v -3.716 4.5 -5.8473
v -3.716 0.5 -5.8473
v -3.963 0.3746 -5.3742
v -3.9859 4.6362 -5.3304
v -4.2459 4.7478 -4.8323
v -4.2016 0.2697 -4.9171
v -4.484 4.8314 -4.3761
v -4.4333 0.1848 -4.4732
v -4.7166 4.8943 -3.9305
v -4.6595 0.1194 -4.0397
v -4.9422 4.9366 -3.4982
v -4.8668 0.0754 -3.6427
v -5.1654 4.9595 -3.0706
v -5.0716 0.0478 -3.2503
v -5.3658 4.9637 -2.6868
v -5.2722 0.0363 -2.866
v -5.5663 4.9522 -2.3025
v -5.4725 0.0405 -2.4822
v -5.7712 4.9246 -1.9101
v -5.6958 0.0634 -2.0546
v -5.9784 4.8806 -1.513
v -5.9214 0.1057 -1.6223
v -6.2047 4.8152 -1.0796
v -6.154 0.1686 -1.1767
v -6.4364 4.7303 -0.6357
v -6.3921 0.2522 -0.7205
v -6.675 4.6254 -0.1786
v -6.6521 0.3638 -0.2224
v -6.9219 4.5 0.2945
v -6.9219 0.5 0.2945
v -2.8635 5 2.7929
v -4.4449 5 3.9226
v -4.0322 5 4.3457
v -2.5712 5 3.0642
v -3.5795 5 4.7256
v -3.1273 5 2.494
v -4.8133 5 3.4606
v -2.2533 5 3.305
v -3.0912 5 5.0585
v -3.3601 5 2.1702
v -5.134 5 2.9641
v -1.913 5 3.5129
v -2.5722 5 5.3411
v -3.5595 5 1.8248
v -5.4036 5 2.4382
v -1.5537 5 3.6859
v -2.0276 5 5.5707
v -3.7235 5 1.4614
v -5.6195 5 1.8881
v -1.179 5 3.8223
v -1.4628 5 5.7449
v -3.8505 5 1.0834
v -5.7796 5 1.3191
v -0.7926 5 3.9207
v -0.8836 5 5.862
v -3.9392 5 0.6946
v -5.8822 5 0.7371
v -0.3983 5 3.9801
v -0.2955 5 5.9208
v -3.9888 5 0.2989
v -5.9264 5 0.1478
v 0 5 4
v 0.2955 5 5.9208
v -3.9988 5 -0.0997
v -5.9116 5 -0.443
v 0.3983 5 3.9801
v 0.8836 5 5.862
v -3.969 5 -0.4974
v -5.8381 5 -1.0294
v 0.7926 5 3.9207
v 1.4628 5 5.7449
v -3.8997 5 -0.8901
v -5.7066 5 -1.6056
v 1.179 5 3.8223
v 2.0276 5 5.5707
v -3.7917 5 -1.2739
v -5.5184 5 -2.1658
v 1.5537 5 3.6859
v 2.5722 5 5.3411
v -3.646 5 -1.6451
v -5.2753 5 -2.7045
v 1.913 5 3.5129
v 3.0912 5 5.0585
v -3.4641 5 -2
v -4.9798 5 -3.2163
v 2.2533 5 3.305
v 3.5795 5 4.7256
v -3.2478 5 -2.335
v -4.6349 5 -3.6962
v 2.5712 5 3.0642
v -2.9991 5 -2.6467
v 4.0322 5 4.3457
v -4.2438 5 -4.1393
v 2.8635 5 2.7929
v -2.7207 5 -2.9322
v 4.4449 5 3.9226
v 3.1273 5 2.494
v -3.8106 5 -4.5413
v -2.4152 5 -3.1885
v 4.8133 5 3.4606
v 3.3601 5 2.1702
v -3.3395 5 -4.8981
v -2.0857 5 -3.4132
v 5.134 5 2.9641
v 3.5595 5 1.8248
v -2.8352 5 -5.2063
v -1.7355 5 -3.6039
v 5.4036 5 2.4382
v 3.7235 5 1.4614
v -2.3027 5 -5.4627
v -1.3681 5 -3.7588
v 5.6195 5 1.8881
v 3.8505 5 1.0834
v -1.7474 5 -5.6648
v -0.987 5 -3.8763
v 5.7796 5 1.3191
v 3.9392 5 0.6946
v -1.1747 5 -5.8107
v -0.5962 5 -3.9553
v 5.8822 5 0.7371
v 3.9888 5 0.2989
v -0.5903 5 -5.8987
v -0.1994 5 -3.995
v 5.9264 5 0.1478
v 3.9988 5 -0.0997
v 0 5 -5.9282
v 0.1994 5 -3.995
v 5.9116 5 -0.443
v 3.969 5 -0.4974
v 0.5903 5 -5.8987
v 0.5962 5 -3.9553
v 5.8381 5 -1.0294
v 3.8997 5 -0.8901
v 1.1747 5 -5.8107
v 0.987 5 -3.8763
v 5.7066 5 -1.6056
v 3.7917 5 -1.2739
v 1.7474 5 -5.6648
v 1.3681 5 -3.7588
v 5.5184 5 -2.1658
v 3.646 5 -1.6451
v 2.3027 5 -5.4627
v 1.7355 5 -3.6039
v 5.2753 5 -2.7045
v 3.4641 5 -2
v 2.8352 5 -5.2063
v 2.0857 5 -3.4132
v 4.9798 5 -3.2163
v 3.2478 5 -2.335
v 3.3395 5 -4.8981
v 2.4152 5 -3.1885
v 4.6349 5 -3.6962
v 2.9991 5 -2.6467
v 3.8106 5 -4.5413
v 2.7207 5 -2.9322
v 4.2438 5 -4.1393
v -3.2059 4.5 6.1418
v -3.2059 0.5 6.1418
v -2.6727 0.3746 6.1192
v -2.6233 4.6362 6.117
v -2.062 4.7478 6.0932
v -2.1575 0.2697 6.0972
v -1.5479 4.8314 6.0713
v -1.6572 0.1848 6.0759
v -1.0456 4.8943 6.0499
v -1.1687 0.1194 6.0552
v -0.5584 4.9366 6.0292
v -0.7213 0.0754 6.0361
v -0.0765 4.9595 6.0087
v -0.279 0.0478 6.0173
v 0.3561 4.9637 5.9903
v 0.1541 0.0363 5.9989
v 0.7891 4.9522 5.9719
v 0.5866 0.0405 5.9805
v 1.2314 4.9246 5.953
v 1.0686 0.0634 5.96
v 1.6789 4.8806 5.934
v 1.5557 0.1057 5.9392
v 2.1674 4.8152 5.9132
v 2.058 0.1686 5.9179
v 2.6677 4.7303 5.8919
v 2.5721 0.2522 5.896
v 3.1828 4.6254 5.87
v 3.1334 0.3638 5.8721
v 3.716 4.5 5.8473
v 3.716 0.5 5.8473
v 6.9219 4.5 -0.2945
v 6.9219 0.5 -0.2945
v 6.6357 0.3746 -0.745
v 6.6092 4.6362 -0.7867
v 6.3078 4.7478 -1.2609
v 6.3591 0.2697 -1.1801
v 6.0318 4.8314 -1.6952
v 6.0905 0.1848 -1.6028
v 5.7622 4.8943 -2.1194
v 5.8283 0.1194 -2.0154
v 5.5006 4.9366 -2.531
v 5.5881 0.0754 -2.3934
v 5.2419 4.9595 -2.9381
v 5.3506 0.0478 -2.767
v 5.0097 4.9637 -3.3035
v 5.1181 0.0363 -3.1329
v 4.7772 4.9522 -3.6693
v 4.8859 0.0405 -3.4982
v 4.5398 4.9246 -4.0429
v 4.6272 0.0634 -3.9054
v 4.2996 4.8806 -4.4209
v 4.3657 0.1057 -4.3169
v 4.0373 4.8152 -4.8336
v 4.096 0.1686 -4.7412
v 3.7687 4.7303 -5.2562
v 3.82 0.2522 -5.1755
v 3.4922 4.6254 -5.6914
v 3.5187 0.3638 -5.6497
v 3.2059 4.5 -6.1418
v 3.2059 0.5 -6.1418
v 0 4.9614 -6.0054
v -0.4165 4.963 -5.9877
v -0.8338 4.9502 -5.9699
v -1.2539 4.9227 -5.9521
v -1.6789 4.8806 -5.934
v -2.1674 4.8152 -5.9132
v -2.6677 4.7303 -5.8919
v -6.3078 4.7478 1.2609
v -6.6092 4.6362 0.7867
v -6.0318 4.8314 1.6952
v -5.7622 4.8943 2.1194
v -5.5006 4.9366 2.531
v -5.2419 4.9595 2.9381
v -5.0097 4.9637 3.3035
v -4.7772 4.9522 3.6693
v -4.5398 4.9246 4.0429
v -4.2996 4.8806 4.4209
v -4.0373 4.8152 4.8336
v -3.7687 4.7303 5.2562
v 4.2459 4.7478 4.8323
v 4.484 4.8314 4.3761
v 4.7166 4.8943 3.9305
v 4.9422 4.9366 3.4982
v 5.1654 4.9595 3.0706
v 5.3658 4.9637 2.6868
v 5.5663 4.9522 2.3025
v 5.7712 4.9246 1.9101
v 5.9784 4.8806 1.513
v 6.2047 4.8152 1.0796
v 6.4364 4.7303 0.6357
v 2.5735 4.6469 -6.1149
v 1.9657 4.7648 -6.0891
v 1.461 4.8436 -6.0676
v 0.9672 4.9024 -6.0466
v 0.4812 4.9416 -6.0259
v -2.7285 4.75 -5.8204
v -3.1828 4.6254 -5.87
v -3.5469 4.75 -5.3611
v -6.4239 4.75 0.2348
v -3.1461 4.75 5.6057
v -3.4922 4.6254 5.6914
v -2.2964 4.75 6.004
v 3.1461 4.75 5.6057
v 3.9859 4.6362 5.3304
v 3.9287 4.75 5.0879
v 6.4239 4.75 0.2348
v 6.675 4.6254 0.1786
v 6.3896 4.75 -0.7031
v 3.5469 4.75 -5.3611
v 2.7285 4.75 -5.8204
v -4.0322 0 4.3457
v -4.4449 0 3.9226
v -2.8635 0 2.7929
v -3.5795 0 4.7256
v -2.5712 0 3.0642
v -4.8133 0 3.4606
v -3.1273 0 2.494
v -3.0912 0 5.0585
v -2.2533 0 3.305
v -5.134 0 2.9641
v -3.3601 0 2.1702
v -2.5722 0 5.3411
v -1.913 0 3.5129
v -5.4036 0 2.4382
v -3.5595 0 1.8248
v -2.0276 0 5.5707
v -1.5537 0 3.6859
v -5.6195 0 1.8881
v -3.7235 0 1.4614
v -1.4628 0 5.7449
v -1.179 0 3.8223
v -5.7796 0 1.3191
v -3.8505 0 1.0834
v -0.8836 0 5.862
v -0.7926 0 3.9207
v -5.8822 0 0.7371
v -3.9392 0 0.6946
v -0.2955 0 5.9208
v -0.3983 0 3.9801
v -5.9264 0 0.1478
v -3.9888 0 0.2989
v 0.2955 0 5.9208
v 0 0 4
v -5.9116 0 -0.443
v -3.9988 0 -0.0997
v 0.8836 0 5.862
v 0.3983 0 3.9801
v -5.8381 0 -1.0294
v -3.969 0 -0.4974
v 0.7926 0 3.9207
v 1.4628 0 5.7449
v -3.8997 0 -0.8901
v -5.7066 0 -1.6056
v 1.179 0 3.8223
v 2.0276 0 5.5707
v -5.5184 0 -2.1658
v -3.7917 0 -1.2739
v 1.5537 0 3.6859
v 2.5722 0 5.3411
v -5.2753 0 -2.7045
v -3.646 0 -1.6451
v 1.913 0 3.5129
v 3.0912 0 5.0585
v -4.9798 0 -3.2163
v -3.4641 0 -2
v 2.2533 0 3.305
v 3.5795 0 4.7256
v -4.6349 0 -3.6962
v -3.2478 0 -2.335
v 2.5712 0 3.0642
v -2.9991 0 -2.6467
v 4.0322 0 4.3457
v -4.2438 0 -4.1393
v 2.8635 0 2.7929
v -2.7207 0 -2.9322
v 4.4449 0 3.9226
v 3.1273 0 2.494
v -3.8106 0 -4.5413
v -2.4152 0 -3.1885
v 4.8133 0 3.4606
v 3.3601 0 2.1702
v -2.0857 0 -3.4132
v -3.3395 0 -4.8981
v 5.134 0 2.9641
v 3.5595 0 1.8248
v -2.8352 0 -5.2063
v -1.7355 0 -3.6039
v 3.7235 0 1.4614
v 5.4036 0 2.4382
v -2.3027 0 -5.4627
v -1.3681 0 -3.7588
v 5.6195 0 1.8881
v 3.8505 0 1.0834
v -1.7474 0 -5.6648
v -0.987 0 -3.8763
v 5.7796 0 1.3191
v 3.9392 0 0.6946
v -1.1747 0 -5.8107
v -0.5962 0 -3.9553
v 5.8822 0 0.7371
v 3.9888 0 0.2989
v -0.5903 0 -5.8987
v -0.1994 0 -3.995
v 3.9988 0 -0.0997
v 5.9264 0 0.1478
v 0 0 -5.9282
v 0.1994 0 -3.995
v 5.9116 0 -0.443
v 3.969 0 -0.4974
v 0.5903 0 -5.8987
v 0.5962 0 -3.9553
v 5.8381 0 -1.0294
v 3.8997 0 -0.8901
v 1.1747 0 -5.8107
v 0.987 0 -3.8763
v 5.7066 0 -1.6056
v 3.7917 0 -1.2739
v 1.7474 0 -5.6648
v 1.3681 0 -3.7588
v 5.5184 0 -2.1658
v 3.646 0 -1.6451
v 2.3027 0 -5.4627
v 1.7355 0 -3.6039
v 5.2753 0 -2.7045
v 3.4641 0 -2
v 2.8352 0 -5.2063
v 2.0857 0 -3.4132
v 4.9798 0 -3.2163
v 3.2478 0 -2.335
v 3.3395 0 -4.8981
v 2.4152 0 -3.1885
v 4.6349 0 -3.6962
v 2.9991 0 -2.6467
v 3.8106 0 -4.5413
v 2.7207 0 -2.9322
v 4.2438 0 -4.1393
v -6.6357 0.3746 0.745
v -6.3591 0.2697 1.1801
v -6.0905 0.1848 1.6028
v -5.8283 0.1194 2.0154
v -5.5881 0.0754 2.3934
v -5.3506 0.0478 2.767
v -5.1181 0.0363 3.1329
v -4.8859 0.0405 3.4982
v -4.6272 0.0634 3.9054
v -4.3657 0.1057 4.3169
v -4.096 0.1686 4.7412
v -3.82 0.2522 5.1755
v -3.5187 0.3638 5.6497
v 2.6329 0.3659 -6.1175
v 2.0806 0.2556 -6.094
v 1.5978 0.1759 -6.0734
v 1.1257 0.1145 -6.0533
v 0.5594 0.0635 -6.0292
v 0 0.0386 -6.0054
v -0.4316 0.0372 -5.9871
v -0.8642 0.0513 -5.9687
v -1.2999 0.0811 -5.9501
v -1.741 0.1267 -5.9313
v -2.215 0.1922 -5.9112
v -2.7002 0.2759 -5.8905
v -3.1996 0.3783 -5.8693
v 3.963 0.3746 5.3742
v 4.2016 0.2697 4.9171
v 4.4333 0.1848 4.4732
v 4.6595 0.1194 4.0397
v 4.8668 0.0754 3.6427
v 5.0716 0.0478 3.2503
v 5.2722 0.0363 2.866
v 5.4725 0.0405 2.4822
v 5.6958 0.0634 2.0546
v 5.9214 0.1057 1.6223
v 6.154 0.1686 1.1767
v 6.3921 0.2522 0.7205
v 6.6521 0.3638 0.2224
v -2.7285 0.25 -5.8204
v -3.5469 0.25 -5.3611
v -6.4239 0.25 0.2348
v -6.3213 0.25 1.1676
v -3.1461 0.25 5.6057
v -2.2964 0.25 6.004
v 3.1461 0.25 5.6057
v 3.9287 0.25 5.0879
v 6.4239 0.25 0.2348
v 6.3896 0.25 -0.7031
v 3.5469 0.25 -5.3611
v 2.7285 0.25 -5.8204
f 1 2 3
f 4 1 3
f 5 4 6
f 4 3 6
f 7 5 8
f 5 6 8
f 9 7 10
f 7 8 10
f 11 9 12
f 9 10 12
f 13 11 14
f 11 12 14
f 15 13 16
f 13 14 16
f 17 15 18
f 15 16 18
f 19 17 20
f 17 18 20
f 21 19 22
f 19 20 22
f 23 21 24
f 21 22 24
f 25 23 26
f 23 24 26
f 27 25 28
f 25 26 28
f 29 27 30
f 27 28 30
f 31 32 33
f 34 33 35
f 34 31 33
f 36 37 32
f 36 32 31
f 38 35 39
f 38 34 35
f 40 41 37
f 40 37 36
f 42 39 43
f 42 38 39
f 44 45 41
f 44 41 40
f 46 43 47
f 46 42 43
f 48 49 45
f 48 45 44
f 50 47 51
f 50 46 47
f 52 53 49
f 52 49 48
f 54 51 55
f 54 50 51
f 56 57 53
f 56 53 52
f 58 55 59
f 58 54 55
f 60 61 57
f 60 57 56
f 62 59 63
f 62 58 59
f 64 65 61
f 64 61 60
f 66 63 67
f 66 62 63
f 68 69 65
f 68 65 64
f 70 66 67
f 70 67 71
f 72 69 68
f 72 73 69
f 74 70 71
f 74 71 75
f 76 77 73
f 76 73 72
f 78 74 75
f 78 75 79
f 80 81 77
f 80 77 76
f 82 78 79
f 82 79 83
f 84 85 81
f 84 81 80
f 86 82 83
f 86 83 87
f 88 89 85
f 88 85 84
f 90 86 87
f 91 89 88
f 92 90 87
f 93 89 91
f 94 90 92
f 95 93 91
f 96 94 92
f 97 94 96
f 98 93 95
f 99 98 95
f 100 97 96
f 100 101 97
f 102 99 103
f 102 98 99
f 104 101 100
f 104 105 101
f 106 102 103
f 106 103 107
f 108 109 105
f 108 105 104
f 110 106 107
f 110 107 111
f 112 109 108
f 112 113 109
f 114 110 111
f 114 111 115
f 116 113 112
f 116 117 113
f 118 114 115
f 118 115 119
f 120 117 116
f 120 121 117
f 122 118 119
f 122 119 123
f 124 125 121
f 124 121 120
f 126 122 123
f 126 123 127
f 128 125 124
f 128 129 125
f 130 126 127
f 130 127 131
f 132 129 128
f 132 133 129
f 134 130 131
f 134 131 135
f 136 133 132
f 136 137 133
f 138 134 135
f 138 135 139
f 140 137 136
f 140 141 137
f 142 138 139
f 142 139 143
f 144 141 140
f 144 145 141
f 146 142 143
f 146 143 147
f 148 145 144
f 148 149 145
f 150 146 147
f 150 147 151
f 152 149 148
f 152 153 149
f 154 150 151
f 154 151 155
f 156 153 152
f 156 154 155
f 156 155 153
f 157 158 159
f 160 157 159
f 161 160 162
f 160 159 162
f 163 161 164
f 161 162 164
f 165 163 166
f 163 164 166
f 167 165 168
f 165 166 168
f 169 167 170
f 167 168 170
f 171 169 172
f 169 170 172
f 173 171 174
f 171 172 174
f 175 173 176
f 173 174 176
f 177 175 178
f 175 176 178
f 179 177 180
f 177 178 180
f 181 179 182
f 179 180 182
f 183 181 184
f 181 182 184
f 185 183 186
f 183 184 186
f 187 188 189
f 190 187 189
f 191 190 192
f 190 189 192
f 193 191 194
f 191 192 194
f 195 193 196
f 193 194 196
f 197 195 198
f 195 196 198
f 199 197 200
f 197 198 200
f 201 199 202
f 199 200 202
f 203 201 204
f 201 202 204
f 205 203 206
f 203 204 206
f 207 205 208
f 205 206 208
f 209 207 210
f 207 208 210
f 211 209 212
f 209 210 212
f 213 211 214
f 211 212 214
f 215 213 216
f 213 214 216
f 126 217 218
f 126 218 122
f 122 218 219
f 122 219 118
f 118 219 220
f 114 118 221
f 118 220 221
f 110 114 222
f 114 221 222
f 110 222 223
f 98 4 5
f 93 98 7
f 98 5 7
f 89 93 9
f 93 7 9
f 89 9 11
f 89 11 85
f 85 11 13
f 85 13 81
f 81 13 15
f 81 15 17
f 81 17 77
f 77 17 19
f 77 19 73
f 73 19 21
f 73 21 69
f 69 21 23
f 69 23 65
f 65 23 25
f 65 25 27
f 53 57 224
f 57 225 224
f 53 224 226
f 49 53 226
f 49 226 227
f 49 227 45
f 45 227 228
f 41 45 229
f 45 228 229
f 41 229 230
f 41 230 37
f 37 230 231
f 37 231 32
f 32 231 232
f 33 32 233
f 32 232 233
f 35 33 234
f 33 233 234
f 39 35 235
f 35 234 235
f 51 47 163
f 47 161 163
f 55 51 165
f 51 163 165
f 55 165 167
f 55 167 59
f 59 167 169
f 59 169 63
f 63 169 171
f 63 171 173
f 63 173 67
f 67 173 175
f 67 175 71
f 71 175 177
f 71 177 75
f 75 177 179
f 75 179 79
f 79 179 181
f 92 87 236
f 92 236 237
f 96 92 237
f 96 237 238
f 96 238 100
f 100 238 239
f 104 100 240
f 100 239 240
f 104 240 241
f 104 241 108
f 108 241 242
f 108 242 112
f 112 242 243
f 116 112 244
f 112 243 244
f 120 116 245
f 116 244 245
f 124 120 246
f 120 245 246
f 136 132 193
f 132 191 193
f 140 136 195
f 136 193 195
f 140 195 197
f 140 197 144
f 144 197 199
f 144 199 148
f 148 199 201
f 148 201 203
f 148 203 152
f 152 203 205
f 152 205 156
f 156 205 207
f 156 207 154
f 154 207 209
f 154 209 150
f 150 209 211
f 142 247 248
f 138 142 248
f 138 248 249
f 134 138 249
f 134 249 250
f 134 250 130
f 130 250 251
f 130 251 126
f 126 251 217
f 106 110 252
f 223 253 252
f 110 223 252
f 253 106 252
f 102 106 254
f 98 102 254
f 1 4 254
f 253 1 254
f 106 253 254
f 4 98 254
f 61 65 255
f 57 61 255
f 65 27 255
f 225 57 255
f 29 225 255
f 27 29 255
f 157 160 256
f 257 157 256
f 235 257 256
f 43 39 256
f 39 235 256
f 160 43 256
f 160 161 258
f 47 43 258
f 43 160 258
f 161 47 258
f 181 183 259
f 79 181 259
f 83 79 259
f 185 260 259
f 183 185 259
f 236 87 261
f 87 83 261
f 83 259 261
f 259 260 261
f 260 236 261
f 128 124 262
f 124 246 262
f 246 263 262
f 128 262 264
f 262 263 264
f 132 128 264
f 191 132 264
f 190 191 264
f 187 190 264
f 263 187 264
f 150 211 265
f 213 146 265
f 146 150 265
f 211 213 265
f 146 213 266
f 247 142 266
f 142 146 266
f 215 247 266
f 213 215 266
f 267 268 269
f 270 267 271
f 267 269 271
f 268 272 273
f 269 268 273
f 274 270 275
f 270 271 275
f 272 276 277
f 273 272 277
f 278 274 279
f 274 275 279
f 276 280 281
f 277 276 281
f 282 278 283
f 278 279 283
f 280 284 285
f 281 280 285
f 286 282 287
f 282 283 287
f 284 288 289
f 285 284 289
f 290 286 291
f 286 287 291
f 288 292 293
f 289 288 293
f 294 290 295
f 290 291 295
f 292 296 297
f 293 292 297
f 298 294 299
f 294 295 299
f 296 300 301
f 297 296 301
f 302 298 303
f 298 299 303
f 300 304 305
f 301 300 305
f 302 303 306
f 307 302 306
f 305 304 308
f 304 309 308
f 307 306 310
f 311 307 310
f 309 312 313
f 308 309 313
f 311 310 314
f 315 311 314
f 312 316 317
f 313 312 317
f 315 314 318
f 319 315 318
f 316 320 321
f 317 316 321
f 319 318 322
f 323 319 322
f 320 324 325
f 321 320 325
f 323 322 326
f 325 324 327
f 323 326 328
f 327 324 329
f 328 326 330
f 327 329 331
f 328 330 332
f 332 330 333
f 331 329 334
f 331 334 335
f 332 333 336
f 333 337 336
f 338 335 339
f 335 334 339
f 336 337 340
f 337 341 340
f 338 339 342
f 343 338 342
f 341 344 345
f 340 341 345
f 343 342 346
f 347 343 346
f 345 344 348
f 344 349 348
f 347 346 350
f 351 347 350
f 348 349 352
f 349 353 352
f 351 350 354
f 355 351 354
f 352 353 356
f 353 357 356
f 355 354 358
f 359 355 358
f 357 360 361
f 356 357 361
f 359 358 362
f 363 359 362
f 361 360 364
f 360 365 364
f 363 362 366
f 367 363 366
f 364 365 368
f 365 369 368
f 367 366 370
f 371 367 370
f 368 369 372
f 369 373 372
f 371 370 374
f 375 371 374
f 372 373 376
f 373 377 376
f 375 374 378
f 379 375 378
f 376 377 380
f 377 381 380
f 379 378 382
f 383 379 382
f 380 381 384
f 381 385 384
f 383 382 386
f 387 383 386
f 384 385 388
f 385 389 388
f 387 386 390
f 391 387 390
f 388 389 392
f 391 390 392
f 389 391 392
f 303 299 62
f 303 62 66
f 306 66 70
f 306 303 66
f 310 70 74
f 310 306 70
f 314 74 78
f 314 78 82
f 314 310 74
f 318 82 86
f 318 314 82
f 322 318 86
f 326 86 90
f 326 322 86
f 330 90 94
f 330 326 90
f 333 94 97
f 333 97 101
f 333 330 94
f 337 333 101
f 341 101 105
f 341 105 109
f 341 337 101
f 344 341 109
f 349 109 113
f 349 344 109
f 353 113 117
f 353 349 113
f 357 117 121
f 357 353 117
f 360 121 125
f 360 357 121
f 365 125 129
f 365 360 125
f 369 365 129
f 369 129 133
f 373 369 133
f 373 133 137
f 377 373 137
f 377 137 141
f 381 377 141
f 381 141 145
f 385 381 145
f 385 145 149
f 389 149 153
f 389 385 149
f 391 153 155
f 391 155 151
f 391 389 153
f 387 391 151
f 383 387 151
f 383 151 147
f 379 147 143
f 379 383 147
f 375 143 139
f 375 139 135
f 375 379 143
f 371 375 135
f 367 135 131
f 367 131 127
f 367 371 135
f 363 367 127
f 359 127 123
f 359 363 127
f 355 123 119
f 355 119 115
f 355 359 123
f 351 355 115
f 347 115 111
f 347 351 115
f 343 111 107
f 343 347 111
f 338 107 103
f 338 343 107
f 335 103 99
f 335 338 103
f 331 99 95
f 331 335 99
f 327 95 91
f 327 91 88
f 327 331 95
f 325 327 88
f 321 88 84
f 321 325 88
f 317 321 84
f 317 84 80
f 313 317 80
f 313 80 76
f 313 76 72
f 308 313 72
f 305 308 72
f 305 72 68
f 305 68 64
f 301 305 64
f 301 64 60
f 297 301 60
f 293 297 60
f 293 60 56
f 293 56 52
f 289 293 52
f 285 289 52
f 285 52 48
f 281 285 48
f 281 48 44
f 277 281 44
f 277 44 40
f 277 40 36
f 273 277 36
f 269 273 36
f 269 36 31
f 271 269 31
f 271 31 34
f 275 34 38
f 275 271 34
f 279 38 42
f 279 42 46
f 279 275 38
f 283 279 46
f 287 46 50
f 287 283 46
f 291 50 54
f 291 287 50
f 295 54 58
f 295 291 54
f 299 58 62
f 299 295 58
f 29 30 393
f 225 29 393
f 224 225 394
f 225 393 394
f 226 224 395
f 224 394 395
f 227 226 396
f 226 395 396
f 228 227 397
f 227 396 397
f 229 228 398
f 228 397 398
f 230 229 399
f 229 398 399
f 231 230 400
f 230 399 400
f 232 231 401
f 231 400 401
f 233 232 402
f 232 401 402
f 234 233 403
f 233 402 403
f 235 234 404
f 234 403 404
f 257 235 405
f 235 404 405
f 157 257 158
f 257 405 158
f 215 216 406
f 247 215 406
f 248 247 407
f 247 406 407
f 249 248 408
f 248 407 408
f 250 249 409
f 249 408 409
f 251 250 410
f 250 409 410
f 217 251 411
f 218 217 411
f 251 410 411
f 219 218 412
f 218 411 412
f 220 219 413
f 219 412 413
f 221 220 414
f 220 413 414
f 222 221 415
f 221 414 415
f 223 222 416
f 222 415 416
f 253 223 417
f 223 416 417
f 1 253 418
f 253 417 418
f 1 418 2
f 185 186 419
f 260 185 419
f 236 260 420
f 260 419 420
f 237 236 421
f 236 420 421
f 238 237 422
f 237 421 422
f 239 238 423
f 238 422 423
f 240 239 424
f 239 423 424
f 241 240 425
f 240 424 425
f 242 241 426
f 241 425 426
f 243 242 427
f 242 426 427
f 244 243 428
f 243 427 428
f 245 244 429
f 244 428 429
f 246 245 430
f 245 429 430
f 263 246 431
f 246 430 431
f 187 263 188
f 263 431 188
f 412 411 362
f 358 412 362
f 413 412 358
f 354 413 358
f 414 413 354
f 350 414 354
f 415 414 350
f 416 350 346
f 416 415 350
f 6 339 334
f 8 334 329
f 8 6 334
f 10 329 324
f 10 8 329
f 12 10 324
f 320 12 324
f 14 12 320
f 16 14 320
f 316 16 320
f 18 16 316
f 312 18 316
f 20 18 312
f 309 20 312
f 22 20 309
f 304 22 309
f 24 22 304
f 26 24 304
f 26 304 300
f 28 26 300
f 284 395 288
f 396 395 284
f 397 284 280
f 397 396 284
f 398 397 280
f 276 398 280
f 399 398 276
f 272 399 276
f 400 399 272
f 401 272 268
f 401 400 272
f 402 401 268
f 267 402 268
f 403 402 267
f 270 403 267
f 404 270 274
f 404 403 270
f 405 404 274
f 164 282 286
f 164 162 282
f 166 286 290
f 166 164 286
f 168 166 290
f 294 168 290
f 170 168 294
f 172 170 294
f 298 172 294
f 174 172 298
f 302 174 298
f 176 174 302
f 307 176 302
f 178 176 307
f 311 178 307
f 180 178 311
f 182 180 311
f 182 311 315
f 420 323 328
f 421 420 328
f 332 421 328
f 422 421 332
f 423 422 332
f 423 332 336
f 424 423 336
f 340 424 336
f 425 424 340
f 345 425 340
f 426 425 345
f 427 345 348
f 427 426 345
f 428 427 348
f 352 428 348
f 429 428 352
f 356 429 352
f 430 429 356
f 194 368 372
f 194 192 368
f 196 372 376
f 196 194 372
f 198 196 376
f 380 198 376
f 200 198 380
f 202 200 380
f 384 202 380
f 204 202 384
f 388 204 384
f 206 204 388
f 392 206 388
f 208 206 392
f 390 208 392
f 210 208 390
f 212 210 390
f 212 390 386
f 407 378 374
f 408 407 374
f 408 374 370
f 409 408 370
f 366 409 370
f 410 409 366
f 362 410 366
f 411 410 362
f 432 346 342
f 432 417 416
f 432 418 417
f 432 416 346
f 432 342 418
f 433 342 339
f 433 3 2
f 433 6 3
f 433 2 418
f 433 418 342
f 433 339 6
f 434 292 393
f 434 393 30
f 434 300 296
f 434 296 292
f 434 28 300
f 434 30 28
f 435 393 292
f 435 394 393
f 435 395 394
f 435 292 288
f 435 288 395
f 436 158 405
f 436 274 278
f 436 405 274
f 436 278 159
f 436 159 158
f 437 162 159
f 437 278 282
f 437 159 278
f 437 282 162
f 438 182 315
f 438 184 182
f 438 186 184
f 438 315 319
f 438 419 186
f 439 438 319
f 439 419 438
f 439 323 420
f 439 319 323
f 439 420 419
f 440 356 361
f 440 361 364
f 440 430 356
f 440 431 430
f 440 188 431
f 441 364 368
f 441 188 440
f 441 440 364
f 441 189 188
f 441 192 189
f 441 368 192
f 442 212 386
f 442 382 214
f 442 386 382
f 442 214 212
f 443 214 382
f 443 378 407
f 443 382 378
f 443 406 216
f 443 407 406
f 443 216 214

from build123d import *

# Parameters (mm, degrees)
SKETCH_1_R      = 4
EXTRUDE_1_DEPTH = 5


with BuildPart() as part:
    # 草图1 → 凸台-拉伸1 (new body)
    with BuildSketch(Plane(origin=(0, 0, 0), x_dir=(1, 0, 0), z_dir=(0, 1, 0))):
        Polygon((3.205904539, 6.141838169), (-3.716035611, 5.847313857), (-6.921940149, -0.294524312), (-3.205904539, -6.141838169), (3.716035611, -5.847313857), (6.921940149, 0.294524312), align=None)
        with Locations(Location((0, 0, 0), (0, 0, 270))):
            Circle(SKETCH_1_R, mode=Mode.SUBTRACT)
    extrude(amount=EXTRUDE_1_DEPTH)

    # 草图2 → 切除-旋转1 (revolve, cut)
    with BuildSketch(Plane(origin=(0, 0, 0), x_dir=(0.4627324620846592, 0, -0.8864979799937897), z_dir=(0.8864979799937897, 0, 0.4627324620846592)), mode=Mode.PRIVATE) as cut_revolve_1_sk:
        Polygon((-6.92820323, 4.5), (-6.92820323, 5), (-5.92820323, 5), align=None)
        Polygon((-6.92820323, 0.5), (-6.92820323, 0), (-5.92820323, 0), align=None)
    revolve(cut_revolve_1_sk.sketch.rotate(Axis((0, 0, 0), (0, 1, 0)), 207.563569327), axis=Axis((0, 0, 0), (0, 1, 0)), mode=Mode.SUBTRACT)


solid = part.part
